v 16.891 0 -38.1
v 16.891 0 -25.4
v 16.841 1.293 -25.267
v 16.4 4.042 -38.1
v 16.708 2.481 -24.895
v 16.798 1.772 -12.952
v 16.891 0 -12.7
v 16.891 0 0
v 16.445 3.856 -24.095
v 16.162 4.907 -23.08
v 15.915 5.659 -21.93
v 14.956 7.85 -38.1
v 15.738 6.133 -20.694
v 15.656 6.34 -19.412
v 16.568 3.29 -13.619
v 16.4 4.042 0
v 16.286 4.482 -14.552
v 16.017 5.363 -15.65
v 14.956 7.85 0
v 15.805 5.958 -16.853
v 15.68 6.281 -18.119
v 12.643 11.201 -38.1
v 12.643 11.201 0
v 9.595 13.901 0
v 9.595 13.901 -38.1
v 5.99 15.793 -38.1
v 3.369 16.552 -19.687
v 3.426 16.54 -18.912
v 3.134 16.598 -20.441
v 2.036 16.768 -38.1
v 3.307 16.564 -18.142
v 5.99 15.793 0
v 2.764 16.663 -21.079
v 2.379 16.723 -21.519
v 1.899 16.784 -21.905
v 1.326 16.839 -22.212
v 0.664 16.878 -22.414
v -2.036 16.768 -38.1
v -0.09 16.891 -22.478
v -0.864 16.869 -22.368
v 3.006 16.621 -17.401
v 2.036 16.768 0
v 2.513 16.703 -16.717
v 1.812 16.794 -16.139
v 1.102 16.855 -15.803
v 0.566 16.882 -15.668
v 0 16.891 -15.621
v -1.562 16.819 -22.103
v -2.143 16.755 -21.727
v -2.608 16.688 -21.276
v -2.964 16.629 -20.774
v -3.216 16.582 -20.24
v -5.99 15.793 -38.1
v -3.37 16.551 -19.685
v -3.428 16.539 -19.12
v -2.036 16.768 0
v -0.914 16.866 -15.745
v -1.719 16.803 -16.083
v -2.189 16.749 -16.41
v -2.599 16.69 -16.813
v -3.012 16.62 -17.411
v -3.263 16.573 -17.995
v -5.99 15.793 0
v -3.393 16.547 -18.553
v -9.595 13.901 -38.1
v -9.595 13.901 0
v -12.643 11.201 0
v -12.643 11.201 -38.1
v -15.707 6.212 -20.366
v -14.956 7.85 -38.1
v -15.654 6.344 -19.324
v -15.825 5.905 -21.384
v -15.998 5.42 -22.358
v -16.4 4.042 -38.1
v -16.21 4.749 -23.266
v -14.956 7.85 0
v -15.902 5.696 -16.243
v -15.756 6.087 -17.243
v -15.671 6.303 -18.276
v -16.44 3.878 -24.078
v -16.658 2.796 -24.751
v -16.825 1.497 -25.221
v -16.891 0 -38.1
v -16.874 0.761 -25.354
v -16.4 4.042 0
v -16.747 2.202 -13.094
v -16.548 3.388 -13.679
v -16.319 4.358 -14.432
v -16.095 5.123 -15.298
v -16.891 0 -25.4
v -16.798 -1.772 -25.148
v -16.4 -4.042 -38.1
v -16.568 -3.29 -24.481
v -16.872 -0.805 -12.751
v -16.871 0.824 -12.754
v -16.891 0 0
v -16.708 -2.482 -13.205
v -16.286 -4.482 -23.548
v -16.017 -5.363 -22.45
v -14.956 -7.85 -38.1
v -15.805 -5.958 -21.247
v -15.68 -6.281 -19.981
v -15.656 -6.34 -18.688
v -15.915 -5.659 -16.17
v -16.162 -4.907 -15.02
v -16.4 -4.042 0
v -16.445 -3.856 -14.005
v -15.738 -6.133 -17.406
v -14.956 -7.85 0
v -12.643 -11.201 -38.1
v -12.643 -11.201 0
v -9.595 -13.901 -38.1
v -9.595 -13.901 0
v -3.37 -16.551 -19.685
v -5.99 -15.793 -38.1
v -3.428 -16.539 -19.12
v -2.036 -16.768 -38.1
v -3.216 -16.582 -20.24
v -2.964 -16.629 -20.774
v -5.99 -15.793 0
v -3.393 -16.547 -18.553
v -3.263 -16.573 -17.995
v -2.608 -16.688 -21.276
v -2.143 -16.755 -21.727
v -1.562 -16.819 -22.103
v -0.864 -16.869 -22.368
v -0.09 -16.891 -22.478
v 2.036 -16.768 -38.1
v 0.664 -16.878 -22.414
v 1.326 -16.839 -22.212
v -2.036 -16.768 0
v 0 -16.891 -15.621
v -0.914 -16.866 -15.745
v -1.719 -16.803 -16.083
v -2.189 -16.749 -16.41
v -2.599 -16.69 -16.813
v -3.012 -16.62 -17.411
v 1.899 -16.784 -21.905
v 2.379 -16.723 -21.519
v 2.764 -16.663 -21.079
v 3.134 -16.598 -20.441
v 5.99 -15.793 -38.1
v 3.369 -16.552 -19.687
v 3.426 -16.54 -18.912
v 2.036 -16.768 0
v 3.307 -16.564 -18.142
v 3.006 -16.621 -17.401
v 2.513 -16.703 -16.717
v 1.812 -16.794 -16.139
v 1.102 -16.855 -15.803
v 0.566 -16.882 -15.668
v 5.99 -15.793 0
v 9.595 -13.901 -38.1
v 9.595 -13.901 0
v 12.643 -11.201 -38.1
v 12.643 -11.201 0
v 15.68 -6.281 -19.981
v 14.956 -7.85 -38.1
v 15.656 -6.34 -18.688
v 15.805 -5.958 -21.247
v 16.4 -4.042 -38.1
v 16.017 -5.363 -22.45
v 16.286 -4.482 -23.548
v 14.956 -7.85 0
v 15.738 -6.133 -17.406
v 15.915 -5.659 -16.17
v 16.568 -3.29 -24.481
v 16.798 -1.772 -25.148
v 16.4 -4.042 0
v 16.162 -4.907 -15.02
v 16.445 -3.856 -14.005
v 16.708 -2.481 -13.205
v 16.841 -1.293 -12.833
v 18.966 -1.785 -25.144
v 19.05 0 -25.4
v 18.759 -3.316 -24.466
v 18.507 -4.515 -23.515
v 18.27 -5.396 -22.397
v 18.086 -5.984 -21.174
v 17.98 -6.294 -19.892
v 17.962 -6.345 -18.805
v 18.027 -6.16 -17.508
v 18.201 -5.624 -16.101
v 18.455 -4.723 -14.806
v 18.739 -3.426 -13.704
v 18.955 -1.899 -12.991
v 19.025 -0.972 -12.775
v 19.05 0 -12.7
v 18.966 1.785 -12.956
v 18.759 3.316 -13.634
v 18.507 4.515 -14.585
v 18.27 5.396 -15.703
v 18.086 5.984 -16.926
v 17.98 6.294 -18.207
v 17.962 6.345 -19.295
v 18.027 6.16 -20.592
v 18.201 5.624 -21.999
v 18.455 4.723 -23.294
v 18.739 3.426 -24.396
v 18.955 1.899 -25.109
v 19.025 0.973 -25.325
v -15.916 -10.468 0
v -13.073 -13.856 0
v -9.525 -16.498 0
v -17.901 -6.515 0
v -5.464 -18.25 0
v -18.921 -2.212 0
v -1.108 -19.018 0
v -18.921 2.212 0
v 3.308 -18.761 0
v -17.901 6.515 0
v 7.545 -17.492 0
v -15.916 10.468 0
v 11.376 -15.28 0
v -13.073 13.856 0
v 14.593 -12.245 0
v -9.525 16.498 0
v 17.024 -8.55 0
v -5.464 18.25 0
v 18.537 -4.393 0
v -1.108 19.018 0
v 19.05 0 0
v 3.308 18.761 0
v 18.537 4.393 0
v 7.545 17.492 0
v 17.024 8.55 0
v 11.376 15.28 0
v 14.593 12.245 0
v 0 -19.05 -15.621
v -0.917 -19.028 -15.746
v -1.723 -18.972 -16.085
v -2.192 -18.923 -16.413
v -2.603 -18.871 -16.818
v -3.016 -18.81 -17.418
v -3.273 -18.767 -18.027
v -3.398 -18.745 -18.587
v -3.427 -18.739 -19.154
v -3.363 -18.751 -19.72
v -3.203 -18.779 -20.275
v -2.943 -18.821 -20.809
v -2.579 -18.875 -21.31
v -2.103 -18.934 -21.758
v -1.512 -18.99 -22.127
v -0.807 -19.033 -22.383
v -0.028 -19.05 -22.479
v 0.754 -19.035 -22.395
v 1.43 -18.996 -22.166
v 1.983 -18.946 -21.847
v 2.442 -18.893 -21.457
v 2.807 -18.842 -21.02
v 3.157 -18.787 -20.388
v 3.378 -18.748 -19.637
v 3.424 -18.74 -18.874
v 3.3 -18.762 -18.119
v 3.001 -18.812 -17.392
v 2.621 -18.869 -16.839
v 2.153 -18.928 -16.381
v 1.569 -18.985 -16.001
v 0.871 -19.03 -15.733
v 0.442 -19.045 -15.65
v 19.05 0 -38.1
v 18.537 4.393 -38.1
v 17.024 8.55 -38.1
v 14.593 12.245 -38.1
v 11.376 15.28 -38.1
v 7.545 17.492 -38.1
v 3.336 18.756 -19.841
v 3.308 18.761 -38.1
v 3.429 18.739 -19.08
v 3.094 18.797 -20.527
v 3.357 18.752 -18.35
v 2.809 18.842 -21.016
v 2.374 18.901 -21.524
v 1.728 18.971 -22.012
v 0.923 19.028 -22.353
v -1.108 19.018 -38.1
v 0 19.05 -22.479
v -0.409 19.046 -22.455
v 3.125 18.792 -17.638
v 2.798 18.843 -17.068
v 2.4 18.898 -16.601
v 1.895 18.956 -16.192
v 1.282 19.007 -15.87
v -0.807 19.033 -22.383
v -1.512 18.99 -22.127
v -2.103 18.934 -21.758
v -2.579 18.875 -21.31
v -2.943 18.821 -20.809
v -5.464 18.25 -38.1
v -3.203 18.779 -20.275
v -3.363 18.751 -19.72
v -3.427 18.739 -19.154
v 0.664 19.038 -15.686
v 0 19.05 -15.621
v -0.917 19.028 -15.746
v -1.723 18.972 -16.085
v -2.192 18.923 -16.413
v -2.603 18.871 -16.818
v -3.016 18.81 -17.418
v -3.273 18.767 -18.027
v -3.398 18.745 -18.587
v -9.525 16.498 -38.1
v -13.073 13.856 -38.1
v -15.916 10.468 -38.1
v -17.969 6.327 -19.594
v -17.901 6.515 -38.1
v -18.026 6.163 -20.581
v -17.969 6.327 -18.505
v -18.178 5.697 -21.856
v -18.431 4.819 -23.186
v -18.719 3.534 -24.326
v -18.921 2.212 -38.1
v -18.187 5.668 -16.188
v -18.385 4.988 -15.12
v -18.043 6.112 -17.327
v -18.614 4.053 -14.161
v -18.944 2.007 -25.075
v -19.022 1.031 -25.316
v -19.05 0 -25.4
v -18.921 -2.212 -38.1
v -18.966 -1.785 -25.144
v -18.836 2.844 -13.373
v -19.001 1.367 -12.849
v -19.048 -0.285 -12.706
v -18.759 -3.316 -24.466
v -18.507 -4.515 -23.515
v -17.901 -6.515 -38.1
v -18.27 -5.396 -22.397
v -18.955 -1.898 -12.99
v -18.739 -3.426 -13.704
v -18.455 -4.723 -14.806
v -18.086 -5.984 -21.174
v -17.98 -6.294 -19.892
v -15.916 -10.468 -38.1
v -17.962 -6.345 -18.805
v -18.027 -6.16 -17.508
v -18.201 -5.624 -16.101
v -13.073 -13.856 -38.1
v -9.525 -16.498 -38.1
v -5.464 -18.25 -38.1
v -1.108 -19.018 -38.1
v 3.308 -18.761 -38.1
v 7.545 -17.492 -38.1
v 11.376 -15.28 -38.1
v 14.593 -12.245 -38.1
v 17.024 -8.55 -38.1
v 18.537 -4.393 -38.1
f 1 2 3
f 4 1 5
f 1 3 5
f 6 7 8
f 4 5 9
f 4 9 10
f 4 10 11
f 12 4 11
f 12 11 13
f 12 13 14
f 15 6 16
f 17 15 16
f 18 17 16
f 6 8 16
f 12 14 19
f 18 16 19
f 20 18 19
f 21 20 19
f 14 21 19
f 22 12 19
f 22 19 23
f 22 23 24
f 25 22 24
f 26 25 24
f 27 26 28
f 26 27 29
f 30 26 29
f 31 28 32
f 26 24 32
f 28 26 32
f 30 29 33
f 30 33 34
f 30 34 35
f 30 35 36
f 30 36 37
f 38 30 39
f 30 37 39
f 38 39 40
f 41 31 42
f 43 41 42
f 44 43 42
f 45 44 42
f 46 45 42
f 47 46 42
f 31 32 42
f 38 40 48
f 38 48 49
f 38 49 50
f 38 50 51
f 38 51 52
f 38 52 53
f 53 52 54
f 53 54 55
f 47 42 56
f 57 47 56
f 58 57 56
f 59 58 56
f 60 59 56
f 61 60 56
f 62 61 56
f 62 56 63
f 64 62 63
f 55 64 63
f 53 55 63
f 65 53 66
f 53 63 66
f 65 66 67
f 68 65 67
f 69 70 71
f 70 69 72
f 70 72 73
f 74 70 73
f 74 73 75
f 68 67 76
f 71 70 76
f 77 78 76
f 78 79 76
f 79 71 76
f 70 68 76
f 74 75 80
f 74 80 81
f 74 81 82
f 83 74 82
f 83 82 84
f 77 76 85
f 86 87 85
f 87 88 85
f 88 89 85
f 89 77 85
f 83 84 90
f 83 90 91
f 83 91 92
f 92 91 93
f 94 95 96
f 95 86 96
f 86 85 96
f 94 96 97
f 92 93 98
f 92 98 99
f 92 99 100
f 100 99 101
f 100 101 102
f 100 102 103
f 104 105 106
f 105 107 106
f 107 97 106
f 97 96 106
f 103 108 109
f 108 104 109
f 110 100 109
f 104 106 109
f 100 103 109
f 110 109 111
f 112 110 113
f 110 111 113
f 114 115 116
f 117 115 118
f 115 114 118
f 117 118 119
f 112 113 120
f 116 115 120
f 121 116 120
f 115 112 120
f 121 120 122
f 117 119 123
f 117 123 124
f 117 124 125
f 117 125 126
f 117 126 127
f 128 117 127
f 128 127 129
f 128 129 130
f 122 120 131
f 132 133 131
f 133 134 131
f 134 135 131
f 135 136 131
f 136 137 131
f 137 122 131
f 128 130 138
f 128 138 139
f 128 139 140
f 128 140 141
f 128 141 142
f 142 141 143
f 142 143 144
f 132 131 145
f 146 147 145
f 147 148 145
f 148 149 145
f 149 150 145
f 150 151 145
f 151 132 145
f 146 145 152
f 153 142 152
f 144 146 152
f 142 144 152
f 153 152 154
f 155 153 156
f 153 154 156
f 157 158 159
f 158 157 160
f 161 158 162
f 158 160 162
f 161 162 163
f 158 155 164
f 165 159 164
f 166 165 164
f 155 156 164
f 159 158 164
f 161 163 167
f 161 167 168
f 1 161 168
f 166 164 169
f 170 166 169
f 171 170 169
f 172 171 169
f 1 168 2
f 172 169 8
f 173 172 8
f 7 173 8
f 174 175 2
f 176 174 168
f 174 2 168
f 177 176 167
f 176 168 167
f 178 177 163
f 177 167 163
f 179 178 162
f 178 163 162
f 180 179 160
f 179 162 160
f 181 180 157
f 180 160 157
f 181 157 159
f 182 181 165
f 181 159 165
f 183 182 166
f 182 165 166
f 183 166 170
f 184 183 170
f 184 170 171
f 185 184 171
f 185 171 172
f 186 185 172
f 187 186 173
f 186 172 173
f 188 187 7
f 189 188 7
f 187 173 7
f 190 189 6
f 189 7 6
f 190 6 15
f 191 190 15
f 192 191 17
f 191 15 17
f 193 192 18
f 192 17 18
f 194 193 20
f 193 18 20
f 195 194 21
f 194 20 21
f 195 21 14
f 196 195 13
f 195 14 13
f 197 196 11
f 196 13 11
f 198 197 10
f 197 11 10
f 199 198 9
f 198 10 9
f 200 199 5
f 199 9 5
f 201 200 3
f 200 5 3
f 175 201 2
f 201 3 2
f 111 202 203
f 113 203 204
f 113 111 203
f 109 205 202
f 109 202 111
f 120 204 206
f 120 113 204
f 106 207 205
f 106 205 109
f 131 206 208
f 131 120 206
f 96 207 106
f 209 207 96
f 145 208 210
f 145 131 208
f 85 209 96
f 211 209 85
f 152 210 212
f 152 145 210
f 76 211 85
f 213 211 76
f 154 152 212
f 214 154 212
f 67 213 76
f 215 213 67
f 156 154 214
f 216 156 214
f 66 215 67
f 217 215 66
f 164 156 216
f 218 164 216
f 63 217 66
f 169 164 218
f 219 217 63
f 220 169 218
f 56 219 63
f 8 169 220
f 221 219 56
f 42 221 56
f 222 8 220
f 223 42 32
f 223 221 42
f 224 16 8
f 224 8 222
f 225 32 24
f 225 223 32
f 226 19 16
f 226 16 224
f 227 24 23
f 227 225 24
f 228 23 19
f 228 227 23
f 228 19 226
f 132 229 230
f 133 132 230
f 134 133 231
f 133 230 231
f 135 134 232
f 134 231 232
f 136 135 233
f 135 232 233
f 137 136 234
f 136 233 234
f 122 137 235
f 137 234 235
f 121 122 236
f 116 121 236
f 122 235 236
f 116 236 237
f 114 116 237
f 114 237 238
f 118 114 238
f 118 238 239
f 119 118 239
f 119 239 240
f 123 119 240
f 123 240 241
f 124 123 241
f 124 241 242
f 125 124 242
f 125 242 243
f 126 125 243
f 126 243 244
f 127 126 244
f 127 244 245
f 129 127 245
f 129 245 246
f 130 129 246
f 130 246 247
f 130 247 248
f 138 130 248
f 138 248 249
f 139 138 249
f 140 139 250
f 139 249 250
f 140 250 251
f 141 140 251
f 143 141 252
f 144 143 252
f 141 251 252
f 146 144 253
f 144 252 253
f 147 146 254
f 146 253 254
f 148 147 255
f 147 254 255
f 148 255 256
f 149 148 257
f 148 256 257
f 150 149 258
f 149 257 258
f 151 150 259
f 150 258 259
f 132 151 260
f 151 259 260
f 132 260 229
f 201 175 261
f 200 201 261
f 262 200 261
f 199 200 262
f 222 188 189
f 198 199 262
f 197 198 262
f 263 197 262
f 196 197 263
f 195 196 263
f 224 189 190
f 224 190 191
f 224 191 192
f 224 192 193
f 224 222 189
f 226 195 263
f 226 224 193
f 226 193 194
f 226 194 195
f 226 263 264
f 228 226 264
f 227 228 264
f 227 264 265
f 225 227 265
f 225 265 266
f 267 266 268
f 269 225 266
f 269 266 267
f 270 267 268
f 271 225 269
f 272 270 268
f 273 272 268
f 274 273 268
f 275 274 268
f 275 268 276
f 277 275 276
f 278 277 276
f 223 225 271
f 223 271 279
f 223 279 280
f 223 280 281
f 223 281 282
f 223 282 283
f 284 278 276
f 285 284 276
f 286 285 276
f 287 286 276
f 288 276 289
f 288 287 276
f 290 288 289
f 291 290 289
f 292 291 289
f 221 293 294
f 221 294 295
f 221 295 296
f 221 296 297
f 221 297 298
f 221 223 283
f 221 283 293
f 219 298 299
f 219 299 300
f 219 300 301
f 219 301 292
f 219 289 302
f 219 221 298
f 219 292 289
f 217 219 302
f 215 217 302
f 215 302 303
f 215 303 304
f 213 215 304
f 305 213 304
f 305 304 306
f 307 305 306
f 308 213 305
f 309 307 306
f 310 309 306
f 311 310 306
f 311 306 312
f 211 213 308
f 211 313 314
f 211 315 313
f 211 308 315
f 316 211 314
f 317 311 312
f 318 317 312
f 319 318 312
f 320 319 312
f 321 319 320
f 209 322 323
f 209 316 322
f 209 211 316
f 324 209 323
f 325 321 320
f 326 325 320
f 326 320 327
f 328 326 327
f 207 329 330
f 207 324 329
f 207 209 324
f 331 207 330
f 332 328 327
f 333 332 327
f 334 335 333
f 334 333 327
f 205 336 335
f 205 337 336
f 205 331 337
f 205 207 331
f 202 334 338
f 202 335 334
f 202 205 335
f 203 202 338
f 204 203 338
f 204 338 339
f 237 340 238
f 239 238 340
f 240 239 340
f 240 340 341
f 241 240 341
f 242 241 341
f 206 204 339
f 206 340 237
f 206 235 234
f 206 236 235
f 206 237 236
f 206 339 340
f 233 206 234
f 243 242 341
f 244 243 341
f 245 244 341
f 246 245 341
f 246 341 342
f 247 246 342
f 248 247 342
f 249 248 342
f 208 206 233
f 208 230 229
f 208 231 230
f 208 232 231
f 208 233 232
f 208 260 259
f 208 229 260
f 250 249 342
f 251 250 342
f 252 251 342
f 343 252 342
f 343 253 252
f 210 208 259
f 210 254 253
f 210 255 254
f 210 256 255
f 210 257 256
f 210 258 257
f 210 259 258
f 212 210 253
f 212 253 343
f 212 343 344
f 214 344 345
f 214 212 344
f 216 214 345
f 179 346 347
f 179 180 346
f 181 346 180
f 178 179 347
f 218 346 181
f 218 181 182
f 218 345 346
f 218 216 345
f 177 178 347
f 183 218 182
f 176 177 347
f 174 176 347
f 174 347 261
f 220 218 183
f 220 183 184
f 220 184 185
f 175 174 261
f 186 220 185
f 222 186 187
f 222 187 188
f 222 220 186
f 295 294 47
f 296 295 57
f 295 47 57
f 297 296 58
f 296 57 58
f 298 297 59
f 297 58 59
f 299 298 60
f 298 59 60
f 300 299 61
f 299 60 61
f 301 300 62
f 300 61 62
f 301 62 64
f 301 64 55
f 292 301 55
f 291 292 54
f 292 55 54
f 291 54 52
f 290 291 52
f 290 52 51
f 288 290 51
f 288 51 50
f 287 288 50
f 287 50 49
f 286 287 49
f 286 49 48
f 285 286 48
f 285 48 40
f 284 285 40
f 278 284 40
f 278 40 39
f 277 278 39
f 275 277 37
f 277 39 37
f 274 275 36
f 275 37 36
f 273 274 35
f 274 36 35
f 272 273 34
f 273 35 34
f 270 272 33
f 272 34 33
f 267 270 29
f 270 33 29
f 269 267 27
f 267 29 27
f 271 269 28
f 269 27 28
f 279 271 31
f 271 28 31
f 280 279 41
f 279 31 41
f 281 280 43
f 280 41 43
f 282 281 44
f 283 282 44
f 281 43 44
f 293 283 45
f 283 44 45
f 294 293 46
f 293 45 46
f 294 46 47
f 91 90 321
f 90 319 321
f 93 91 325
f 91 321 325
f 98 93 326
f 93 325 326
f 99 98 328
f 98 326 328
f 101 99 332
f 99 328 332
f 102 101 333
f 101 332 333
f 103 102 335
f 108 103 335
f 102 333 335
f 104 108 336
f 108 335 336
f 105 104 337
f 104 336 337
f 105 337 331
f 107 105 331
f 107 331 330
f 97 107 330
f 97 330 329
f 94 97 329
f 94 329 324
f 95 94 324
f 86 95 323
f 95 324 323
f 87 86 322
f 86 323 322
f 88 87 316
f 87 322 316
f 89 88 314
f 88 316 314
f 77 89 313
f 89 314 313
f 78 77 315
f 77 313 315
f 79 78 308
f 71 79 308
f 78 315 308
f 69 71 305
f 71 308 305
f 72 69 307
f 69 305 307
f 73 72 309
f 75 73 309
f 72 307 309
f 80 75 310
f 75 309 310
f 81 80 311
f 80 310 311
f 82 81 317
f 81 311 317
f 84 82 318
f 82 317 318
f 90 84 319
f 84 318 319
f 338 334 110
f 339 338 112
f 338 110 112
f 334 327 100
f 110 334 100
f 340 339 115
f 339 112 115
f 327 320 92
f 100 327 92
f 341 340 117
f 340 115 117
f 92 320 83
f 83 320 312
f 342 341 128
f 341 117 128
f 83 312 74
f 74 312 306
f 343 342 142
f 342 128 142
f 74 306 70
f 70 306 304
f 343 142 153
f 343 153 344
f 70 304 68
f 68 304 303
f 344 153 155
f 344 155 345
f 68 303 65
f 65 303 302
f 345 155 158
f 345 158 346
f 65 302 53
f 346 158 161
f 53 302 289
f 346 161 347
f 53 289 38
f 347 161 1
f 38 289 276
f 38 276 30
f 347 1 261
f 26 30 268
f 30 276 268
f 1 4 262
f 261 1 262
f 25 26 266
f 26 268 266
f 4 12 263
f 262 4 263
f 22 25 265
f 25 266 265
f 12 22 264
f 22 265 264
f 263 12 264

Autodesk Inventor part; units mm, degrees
ref_plane "XY Plane" through (0, 0, 0) normal (0, 0, 1) x (1, 0, 0)
sketch "Sketch1" plane through (0, 0, 0) normal (0, 0, 1) x (1, 0, 0)
  circle A0 centre (0, 0) radius 19.05
  circle A1 centre (0, 0) radius 16.891
  dimension "d0" = 38.1
  dimension "d2" = 33.782
extrude "Extrusion1" add sketch "Sketch1" against normal blind 38.1
ref_plane "Work Plane1" through (19.05, 0, 0) normal (1, 0, 0) x (0, 1, 0)
sketch "Sketch2" plane through (19.05, 0, 0) normal (1, 0, 0) x (0, 1, 0)
  line L0 (19.05, 0) -> (19.05, -38.1) projected
  point P0 (0, 0)
  point P1 (0, -19.05)
  point P2 (19.05, -19.05)
hole "Hole1" at (19.05, 0, -19.05) direction (-1, 0, 0) diameter 12.7 end through all
ref_plane "Work Plane2" through (0, 19.05, 0) normal (0, 1, 0) x (-1, 0, 0)
sketch "Sketch3" plane through (0, 19.05, 0) normal (0, 1, 0) x (-1, 0, 0)
  line L0 (19.05, 0) -> (19.05, -38.1) projected
  line L1 (-19.05, 0) -> (19.05, 0) projected
  point P0 (0, 0)
  point P1 (0, -19.05)
  point P2 (0, 0)
  point P3 (19.05, -19.05)
hole "Hole2" at (0, 19.05, -19.05) direction (0, -1, 0) diameter 6.858 end through all
properties part number "GE-13026-01" material "Steel"
